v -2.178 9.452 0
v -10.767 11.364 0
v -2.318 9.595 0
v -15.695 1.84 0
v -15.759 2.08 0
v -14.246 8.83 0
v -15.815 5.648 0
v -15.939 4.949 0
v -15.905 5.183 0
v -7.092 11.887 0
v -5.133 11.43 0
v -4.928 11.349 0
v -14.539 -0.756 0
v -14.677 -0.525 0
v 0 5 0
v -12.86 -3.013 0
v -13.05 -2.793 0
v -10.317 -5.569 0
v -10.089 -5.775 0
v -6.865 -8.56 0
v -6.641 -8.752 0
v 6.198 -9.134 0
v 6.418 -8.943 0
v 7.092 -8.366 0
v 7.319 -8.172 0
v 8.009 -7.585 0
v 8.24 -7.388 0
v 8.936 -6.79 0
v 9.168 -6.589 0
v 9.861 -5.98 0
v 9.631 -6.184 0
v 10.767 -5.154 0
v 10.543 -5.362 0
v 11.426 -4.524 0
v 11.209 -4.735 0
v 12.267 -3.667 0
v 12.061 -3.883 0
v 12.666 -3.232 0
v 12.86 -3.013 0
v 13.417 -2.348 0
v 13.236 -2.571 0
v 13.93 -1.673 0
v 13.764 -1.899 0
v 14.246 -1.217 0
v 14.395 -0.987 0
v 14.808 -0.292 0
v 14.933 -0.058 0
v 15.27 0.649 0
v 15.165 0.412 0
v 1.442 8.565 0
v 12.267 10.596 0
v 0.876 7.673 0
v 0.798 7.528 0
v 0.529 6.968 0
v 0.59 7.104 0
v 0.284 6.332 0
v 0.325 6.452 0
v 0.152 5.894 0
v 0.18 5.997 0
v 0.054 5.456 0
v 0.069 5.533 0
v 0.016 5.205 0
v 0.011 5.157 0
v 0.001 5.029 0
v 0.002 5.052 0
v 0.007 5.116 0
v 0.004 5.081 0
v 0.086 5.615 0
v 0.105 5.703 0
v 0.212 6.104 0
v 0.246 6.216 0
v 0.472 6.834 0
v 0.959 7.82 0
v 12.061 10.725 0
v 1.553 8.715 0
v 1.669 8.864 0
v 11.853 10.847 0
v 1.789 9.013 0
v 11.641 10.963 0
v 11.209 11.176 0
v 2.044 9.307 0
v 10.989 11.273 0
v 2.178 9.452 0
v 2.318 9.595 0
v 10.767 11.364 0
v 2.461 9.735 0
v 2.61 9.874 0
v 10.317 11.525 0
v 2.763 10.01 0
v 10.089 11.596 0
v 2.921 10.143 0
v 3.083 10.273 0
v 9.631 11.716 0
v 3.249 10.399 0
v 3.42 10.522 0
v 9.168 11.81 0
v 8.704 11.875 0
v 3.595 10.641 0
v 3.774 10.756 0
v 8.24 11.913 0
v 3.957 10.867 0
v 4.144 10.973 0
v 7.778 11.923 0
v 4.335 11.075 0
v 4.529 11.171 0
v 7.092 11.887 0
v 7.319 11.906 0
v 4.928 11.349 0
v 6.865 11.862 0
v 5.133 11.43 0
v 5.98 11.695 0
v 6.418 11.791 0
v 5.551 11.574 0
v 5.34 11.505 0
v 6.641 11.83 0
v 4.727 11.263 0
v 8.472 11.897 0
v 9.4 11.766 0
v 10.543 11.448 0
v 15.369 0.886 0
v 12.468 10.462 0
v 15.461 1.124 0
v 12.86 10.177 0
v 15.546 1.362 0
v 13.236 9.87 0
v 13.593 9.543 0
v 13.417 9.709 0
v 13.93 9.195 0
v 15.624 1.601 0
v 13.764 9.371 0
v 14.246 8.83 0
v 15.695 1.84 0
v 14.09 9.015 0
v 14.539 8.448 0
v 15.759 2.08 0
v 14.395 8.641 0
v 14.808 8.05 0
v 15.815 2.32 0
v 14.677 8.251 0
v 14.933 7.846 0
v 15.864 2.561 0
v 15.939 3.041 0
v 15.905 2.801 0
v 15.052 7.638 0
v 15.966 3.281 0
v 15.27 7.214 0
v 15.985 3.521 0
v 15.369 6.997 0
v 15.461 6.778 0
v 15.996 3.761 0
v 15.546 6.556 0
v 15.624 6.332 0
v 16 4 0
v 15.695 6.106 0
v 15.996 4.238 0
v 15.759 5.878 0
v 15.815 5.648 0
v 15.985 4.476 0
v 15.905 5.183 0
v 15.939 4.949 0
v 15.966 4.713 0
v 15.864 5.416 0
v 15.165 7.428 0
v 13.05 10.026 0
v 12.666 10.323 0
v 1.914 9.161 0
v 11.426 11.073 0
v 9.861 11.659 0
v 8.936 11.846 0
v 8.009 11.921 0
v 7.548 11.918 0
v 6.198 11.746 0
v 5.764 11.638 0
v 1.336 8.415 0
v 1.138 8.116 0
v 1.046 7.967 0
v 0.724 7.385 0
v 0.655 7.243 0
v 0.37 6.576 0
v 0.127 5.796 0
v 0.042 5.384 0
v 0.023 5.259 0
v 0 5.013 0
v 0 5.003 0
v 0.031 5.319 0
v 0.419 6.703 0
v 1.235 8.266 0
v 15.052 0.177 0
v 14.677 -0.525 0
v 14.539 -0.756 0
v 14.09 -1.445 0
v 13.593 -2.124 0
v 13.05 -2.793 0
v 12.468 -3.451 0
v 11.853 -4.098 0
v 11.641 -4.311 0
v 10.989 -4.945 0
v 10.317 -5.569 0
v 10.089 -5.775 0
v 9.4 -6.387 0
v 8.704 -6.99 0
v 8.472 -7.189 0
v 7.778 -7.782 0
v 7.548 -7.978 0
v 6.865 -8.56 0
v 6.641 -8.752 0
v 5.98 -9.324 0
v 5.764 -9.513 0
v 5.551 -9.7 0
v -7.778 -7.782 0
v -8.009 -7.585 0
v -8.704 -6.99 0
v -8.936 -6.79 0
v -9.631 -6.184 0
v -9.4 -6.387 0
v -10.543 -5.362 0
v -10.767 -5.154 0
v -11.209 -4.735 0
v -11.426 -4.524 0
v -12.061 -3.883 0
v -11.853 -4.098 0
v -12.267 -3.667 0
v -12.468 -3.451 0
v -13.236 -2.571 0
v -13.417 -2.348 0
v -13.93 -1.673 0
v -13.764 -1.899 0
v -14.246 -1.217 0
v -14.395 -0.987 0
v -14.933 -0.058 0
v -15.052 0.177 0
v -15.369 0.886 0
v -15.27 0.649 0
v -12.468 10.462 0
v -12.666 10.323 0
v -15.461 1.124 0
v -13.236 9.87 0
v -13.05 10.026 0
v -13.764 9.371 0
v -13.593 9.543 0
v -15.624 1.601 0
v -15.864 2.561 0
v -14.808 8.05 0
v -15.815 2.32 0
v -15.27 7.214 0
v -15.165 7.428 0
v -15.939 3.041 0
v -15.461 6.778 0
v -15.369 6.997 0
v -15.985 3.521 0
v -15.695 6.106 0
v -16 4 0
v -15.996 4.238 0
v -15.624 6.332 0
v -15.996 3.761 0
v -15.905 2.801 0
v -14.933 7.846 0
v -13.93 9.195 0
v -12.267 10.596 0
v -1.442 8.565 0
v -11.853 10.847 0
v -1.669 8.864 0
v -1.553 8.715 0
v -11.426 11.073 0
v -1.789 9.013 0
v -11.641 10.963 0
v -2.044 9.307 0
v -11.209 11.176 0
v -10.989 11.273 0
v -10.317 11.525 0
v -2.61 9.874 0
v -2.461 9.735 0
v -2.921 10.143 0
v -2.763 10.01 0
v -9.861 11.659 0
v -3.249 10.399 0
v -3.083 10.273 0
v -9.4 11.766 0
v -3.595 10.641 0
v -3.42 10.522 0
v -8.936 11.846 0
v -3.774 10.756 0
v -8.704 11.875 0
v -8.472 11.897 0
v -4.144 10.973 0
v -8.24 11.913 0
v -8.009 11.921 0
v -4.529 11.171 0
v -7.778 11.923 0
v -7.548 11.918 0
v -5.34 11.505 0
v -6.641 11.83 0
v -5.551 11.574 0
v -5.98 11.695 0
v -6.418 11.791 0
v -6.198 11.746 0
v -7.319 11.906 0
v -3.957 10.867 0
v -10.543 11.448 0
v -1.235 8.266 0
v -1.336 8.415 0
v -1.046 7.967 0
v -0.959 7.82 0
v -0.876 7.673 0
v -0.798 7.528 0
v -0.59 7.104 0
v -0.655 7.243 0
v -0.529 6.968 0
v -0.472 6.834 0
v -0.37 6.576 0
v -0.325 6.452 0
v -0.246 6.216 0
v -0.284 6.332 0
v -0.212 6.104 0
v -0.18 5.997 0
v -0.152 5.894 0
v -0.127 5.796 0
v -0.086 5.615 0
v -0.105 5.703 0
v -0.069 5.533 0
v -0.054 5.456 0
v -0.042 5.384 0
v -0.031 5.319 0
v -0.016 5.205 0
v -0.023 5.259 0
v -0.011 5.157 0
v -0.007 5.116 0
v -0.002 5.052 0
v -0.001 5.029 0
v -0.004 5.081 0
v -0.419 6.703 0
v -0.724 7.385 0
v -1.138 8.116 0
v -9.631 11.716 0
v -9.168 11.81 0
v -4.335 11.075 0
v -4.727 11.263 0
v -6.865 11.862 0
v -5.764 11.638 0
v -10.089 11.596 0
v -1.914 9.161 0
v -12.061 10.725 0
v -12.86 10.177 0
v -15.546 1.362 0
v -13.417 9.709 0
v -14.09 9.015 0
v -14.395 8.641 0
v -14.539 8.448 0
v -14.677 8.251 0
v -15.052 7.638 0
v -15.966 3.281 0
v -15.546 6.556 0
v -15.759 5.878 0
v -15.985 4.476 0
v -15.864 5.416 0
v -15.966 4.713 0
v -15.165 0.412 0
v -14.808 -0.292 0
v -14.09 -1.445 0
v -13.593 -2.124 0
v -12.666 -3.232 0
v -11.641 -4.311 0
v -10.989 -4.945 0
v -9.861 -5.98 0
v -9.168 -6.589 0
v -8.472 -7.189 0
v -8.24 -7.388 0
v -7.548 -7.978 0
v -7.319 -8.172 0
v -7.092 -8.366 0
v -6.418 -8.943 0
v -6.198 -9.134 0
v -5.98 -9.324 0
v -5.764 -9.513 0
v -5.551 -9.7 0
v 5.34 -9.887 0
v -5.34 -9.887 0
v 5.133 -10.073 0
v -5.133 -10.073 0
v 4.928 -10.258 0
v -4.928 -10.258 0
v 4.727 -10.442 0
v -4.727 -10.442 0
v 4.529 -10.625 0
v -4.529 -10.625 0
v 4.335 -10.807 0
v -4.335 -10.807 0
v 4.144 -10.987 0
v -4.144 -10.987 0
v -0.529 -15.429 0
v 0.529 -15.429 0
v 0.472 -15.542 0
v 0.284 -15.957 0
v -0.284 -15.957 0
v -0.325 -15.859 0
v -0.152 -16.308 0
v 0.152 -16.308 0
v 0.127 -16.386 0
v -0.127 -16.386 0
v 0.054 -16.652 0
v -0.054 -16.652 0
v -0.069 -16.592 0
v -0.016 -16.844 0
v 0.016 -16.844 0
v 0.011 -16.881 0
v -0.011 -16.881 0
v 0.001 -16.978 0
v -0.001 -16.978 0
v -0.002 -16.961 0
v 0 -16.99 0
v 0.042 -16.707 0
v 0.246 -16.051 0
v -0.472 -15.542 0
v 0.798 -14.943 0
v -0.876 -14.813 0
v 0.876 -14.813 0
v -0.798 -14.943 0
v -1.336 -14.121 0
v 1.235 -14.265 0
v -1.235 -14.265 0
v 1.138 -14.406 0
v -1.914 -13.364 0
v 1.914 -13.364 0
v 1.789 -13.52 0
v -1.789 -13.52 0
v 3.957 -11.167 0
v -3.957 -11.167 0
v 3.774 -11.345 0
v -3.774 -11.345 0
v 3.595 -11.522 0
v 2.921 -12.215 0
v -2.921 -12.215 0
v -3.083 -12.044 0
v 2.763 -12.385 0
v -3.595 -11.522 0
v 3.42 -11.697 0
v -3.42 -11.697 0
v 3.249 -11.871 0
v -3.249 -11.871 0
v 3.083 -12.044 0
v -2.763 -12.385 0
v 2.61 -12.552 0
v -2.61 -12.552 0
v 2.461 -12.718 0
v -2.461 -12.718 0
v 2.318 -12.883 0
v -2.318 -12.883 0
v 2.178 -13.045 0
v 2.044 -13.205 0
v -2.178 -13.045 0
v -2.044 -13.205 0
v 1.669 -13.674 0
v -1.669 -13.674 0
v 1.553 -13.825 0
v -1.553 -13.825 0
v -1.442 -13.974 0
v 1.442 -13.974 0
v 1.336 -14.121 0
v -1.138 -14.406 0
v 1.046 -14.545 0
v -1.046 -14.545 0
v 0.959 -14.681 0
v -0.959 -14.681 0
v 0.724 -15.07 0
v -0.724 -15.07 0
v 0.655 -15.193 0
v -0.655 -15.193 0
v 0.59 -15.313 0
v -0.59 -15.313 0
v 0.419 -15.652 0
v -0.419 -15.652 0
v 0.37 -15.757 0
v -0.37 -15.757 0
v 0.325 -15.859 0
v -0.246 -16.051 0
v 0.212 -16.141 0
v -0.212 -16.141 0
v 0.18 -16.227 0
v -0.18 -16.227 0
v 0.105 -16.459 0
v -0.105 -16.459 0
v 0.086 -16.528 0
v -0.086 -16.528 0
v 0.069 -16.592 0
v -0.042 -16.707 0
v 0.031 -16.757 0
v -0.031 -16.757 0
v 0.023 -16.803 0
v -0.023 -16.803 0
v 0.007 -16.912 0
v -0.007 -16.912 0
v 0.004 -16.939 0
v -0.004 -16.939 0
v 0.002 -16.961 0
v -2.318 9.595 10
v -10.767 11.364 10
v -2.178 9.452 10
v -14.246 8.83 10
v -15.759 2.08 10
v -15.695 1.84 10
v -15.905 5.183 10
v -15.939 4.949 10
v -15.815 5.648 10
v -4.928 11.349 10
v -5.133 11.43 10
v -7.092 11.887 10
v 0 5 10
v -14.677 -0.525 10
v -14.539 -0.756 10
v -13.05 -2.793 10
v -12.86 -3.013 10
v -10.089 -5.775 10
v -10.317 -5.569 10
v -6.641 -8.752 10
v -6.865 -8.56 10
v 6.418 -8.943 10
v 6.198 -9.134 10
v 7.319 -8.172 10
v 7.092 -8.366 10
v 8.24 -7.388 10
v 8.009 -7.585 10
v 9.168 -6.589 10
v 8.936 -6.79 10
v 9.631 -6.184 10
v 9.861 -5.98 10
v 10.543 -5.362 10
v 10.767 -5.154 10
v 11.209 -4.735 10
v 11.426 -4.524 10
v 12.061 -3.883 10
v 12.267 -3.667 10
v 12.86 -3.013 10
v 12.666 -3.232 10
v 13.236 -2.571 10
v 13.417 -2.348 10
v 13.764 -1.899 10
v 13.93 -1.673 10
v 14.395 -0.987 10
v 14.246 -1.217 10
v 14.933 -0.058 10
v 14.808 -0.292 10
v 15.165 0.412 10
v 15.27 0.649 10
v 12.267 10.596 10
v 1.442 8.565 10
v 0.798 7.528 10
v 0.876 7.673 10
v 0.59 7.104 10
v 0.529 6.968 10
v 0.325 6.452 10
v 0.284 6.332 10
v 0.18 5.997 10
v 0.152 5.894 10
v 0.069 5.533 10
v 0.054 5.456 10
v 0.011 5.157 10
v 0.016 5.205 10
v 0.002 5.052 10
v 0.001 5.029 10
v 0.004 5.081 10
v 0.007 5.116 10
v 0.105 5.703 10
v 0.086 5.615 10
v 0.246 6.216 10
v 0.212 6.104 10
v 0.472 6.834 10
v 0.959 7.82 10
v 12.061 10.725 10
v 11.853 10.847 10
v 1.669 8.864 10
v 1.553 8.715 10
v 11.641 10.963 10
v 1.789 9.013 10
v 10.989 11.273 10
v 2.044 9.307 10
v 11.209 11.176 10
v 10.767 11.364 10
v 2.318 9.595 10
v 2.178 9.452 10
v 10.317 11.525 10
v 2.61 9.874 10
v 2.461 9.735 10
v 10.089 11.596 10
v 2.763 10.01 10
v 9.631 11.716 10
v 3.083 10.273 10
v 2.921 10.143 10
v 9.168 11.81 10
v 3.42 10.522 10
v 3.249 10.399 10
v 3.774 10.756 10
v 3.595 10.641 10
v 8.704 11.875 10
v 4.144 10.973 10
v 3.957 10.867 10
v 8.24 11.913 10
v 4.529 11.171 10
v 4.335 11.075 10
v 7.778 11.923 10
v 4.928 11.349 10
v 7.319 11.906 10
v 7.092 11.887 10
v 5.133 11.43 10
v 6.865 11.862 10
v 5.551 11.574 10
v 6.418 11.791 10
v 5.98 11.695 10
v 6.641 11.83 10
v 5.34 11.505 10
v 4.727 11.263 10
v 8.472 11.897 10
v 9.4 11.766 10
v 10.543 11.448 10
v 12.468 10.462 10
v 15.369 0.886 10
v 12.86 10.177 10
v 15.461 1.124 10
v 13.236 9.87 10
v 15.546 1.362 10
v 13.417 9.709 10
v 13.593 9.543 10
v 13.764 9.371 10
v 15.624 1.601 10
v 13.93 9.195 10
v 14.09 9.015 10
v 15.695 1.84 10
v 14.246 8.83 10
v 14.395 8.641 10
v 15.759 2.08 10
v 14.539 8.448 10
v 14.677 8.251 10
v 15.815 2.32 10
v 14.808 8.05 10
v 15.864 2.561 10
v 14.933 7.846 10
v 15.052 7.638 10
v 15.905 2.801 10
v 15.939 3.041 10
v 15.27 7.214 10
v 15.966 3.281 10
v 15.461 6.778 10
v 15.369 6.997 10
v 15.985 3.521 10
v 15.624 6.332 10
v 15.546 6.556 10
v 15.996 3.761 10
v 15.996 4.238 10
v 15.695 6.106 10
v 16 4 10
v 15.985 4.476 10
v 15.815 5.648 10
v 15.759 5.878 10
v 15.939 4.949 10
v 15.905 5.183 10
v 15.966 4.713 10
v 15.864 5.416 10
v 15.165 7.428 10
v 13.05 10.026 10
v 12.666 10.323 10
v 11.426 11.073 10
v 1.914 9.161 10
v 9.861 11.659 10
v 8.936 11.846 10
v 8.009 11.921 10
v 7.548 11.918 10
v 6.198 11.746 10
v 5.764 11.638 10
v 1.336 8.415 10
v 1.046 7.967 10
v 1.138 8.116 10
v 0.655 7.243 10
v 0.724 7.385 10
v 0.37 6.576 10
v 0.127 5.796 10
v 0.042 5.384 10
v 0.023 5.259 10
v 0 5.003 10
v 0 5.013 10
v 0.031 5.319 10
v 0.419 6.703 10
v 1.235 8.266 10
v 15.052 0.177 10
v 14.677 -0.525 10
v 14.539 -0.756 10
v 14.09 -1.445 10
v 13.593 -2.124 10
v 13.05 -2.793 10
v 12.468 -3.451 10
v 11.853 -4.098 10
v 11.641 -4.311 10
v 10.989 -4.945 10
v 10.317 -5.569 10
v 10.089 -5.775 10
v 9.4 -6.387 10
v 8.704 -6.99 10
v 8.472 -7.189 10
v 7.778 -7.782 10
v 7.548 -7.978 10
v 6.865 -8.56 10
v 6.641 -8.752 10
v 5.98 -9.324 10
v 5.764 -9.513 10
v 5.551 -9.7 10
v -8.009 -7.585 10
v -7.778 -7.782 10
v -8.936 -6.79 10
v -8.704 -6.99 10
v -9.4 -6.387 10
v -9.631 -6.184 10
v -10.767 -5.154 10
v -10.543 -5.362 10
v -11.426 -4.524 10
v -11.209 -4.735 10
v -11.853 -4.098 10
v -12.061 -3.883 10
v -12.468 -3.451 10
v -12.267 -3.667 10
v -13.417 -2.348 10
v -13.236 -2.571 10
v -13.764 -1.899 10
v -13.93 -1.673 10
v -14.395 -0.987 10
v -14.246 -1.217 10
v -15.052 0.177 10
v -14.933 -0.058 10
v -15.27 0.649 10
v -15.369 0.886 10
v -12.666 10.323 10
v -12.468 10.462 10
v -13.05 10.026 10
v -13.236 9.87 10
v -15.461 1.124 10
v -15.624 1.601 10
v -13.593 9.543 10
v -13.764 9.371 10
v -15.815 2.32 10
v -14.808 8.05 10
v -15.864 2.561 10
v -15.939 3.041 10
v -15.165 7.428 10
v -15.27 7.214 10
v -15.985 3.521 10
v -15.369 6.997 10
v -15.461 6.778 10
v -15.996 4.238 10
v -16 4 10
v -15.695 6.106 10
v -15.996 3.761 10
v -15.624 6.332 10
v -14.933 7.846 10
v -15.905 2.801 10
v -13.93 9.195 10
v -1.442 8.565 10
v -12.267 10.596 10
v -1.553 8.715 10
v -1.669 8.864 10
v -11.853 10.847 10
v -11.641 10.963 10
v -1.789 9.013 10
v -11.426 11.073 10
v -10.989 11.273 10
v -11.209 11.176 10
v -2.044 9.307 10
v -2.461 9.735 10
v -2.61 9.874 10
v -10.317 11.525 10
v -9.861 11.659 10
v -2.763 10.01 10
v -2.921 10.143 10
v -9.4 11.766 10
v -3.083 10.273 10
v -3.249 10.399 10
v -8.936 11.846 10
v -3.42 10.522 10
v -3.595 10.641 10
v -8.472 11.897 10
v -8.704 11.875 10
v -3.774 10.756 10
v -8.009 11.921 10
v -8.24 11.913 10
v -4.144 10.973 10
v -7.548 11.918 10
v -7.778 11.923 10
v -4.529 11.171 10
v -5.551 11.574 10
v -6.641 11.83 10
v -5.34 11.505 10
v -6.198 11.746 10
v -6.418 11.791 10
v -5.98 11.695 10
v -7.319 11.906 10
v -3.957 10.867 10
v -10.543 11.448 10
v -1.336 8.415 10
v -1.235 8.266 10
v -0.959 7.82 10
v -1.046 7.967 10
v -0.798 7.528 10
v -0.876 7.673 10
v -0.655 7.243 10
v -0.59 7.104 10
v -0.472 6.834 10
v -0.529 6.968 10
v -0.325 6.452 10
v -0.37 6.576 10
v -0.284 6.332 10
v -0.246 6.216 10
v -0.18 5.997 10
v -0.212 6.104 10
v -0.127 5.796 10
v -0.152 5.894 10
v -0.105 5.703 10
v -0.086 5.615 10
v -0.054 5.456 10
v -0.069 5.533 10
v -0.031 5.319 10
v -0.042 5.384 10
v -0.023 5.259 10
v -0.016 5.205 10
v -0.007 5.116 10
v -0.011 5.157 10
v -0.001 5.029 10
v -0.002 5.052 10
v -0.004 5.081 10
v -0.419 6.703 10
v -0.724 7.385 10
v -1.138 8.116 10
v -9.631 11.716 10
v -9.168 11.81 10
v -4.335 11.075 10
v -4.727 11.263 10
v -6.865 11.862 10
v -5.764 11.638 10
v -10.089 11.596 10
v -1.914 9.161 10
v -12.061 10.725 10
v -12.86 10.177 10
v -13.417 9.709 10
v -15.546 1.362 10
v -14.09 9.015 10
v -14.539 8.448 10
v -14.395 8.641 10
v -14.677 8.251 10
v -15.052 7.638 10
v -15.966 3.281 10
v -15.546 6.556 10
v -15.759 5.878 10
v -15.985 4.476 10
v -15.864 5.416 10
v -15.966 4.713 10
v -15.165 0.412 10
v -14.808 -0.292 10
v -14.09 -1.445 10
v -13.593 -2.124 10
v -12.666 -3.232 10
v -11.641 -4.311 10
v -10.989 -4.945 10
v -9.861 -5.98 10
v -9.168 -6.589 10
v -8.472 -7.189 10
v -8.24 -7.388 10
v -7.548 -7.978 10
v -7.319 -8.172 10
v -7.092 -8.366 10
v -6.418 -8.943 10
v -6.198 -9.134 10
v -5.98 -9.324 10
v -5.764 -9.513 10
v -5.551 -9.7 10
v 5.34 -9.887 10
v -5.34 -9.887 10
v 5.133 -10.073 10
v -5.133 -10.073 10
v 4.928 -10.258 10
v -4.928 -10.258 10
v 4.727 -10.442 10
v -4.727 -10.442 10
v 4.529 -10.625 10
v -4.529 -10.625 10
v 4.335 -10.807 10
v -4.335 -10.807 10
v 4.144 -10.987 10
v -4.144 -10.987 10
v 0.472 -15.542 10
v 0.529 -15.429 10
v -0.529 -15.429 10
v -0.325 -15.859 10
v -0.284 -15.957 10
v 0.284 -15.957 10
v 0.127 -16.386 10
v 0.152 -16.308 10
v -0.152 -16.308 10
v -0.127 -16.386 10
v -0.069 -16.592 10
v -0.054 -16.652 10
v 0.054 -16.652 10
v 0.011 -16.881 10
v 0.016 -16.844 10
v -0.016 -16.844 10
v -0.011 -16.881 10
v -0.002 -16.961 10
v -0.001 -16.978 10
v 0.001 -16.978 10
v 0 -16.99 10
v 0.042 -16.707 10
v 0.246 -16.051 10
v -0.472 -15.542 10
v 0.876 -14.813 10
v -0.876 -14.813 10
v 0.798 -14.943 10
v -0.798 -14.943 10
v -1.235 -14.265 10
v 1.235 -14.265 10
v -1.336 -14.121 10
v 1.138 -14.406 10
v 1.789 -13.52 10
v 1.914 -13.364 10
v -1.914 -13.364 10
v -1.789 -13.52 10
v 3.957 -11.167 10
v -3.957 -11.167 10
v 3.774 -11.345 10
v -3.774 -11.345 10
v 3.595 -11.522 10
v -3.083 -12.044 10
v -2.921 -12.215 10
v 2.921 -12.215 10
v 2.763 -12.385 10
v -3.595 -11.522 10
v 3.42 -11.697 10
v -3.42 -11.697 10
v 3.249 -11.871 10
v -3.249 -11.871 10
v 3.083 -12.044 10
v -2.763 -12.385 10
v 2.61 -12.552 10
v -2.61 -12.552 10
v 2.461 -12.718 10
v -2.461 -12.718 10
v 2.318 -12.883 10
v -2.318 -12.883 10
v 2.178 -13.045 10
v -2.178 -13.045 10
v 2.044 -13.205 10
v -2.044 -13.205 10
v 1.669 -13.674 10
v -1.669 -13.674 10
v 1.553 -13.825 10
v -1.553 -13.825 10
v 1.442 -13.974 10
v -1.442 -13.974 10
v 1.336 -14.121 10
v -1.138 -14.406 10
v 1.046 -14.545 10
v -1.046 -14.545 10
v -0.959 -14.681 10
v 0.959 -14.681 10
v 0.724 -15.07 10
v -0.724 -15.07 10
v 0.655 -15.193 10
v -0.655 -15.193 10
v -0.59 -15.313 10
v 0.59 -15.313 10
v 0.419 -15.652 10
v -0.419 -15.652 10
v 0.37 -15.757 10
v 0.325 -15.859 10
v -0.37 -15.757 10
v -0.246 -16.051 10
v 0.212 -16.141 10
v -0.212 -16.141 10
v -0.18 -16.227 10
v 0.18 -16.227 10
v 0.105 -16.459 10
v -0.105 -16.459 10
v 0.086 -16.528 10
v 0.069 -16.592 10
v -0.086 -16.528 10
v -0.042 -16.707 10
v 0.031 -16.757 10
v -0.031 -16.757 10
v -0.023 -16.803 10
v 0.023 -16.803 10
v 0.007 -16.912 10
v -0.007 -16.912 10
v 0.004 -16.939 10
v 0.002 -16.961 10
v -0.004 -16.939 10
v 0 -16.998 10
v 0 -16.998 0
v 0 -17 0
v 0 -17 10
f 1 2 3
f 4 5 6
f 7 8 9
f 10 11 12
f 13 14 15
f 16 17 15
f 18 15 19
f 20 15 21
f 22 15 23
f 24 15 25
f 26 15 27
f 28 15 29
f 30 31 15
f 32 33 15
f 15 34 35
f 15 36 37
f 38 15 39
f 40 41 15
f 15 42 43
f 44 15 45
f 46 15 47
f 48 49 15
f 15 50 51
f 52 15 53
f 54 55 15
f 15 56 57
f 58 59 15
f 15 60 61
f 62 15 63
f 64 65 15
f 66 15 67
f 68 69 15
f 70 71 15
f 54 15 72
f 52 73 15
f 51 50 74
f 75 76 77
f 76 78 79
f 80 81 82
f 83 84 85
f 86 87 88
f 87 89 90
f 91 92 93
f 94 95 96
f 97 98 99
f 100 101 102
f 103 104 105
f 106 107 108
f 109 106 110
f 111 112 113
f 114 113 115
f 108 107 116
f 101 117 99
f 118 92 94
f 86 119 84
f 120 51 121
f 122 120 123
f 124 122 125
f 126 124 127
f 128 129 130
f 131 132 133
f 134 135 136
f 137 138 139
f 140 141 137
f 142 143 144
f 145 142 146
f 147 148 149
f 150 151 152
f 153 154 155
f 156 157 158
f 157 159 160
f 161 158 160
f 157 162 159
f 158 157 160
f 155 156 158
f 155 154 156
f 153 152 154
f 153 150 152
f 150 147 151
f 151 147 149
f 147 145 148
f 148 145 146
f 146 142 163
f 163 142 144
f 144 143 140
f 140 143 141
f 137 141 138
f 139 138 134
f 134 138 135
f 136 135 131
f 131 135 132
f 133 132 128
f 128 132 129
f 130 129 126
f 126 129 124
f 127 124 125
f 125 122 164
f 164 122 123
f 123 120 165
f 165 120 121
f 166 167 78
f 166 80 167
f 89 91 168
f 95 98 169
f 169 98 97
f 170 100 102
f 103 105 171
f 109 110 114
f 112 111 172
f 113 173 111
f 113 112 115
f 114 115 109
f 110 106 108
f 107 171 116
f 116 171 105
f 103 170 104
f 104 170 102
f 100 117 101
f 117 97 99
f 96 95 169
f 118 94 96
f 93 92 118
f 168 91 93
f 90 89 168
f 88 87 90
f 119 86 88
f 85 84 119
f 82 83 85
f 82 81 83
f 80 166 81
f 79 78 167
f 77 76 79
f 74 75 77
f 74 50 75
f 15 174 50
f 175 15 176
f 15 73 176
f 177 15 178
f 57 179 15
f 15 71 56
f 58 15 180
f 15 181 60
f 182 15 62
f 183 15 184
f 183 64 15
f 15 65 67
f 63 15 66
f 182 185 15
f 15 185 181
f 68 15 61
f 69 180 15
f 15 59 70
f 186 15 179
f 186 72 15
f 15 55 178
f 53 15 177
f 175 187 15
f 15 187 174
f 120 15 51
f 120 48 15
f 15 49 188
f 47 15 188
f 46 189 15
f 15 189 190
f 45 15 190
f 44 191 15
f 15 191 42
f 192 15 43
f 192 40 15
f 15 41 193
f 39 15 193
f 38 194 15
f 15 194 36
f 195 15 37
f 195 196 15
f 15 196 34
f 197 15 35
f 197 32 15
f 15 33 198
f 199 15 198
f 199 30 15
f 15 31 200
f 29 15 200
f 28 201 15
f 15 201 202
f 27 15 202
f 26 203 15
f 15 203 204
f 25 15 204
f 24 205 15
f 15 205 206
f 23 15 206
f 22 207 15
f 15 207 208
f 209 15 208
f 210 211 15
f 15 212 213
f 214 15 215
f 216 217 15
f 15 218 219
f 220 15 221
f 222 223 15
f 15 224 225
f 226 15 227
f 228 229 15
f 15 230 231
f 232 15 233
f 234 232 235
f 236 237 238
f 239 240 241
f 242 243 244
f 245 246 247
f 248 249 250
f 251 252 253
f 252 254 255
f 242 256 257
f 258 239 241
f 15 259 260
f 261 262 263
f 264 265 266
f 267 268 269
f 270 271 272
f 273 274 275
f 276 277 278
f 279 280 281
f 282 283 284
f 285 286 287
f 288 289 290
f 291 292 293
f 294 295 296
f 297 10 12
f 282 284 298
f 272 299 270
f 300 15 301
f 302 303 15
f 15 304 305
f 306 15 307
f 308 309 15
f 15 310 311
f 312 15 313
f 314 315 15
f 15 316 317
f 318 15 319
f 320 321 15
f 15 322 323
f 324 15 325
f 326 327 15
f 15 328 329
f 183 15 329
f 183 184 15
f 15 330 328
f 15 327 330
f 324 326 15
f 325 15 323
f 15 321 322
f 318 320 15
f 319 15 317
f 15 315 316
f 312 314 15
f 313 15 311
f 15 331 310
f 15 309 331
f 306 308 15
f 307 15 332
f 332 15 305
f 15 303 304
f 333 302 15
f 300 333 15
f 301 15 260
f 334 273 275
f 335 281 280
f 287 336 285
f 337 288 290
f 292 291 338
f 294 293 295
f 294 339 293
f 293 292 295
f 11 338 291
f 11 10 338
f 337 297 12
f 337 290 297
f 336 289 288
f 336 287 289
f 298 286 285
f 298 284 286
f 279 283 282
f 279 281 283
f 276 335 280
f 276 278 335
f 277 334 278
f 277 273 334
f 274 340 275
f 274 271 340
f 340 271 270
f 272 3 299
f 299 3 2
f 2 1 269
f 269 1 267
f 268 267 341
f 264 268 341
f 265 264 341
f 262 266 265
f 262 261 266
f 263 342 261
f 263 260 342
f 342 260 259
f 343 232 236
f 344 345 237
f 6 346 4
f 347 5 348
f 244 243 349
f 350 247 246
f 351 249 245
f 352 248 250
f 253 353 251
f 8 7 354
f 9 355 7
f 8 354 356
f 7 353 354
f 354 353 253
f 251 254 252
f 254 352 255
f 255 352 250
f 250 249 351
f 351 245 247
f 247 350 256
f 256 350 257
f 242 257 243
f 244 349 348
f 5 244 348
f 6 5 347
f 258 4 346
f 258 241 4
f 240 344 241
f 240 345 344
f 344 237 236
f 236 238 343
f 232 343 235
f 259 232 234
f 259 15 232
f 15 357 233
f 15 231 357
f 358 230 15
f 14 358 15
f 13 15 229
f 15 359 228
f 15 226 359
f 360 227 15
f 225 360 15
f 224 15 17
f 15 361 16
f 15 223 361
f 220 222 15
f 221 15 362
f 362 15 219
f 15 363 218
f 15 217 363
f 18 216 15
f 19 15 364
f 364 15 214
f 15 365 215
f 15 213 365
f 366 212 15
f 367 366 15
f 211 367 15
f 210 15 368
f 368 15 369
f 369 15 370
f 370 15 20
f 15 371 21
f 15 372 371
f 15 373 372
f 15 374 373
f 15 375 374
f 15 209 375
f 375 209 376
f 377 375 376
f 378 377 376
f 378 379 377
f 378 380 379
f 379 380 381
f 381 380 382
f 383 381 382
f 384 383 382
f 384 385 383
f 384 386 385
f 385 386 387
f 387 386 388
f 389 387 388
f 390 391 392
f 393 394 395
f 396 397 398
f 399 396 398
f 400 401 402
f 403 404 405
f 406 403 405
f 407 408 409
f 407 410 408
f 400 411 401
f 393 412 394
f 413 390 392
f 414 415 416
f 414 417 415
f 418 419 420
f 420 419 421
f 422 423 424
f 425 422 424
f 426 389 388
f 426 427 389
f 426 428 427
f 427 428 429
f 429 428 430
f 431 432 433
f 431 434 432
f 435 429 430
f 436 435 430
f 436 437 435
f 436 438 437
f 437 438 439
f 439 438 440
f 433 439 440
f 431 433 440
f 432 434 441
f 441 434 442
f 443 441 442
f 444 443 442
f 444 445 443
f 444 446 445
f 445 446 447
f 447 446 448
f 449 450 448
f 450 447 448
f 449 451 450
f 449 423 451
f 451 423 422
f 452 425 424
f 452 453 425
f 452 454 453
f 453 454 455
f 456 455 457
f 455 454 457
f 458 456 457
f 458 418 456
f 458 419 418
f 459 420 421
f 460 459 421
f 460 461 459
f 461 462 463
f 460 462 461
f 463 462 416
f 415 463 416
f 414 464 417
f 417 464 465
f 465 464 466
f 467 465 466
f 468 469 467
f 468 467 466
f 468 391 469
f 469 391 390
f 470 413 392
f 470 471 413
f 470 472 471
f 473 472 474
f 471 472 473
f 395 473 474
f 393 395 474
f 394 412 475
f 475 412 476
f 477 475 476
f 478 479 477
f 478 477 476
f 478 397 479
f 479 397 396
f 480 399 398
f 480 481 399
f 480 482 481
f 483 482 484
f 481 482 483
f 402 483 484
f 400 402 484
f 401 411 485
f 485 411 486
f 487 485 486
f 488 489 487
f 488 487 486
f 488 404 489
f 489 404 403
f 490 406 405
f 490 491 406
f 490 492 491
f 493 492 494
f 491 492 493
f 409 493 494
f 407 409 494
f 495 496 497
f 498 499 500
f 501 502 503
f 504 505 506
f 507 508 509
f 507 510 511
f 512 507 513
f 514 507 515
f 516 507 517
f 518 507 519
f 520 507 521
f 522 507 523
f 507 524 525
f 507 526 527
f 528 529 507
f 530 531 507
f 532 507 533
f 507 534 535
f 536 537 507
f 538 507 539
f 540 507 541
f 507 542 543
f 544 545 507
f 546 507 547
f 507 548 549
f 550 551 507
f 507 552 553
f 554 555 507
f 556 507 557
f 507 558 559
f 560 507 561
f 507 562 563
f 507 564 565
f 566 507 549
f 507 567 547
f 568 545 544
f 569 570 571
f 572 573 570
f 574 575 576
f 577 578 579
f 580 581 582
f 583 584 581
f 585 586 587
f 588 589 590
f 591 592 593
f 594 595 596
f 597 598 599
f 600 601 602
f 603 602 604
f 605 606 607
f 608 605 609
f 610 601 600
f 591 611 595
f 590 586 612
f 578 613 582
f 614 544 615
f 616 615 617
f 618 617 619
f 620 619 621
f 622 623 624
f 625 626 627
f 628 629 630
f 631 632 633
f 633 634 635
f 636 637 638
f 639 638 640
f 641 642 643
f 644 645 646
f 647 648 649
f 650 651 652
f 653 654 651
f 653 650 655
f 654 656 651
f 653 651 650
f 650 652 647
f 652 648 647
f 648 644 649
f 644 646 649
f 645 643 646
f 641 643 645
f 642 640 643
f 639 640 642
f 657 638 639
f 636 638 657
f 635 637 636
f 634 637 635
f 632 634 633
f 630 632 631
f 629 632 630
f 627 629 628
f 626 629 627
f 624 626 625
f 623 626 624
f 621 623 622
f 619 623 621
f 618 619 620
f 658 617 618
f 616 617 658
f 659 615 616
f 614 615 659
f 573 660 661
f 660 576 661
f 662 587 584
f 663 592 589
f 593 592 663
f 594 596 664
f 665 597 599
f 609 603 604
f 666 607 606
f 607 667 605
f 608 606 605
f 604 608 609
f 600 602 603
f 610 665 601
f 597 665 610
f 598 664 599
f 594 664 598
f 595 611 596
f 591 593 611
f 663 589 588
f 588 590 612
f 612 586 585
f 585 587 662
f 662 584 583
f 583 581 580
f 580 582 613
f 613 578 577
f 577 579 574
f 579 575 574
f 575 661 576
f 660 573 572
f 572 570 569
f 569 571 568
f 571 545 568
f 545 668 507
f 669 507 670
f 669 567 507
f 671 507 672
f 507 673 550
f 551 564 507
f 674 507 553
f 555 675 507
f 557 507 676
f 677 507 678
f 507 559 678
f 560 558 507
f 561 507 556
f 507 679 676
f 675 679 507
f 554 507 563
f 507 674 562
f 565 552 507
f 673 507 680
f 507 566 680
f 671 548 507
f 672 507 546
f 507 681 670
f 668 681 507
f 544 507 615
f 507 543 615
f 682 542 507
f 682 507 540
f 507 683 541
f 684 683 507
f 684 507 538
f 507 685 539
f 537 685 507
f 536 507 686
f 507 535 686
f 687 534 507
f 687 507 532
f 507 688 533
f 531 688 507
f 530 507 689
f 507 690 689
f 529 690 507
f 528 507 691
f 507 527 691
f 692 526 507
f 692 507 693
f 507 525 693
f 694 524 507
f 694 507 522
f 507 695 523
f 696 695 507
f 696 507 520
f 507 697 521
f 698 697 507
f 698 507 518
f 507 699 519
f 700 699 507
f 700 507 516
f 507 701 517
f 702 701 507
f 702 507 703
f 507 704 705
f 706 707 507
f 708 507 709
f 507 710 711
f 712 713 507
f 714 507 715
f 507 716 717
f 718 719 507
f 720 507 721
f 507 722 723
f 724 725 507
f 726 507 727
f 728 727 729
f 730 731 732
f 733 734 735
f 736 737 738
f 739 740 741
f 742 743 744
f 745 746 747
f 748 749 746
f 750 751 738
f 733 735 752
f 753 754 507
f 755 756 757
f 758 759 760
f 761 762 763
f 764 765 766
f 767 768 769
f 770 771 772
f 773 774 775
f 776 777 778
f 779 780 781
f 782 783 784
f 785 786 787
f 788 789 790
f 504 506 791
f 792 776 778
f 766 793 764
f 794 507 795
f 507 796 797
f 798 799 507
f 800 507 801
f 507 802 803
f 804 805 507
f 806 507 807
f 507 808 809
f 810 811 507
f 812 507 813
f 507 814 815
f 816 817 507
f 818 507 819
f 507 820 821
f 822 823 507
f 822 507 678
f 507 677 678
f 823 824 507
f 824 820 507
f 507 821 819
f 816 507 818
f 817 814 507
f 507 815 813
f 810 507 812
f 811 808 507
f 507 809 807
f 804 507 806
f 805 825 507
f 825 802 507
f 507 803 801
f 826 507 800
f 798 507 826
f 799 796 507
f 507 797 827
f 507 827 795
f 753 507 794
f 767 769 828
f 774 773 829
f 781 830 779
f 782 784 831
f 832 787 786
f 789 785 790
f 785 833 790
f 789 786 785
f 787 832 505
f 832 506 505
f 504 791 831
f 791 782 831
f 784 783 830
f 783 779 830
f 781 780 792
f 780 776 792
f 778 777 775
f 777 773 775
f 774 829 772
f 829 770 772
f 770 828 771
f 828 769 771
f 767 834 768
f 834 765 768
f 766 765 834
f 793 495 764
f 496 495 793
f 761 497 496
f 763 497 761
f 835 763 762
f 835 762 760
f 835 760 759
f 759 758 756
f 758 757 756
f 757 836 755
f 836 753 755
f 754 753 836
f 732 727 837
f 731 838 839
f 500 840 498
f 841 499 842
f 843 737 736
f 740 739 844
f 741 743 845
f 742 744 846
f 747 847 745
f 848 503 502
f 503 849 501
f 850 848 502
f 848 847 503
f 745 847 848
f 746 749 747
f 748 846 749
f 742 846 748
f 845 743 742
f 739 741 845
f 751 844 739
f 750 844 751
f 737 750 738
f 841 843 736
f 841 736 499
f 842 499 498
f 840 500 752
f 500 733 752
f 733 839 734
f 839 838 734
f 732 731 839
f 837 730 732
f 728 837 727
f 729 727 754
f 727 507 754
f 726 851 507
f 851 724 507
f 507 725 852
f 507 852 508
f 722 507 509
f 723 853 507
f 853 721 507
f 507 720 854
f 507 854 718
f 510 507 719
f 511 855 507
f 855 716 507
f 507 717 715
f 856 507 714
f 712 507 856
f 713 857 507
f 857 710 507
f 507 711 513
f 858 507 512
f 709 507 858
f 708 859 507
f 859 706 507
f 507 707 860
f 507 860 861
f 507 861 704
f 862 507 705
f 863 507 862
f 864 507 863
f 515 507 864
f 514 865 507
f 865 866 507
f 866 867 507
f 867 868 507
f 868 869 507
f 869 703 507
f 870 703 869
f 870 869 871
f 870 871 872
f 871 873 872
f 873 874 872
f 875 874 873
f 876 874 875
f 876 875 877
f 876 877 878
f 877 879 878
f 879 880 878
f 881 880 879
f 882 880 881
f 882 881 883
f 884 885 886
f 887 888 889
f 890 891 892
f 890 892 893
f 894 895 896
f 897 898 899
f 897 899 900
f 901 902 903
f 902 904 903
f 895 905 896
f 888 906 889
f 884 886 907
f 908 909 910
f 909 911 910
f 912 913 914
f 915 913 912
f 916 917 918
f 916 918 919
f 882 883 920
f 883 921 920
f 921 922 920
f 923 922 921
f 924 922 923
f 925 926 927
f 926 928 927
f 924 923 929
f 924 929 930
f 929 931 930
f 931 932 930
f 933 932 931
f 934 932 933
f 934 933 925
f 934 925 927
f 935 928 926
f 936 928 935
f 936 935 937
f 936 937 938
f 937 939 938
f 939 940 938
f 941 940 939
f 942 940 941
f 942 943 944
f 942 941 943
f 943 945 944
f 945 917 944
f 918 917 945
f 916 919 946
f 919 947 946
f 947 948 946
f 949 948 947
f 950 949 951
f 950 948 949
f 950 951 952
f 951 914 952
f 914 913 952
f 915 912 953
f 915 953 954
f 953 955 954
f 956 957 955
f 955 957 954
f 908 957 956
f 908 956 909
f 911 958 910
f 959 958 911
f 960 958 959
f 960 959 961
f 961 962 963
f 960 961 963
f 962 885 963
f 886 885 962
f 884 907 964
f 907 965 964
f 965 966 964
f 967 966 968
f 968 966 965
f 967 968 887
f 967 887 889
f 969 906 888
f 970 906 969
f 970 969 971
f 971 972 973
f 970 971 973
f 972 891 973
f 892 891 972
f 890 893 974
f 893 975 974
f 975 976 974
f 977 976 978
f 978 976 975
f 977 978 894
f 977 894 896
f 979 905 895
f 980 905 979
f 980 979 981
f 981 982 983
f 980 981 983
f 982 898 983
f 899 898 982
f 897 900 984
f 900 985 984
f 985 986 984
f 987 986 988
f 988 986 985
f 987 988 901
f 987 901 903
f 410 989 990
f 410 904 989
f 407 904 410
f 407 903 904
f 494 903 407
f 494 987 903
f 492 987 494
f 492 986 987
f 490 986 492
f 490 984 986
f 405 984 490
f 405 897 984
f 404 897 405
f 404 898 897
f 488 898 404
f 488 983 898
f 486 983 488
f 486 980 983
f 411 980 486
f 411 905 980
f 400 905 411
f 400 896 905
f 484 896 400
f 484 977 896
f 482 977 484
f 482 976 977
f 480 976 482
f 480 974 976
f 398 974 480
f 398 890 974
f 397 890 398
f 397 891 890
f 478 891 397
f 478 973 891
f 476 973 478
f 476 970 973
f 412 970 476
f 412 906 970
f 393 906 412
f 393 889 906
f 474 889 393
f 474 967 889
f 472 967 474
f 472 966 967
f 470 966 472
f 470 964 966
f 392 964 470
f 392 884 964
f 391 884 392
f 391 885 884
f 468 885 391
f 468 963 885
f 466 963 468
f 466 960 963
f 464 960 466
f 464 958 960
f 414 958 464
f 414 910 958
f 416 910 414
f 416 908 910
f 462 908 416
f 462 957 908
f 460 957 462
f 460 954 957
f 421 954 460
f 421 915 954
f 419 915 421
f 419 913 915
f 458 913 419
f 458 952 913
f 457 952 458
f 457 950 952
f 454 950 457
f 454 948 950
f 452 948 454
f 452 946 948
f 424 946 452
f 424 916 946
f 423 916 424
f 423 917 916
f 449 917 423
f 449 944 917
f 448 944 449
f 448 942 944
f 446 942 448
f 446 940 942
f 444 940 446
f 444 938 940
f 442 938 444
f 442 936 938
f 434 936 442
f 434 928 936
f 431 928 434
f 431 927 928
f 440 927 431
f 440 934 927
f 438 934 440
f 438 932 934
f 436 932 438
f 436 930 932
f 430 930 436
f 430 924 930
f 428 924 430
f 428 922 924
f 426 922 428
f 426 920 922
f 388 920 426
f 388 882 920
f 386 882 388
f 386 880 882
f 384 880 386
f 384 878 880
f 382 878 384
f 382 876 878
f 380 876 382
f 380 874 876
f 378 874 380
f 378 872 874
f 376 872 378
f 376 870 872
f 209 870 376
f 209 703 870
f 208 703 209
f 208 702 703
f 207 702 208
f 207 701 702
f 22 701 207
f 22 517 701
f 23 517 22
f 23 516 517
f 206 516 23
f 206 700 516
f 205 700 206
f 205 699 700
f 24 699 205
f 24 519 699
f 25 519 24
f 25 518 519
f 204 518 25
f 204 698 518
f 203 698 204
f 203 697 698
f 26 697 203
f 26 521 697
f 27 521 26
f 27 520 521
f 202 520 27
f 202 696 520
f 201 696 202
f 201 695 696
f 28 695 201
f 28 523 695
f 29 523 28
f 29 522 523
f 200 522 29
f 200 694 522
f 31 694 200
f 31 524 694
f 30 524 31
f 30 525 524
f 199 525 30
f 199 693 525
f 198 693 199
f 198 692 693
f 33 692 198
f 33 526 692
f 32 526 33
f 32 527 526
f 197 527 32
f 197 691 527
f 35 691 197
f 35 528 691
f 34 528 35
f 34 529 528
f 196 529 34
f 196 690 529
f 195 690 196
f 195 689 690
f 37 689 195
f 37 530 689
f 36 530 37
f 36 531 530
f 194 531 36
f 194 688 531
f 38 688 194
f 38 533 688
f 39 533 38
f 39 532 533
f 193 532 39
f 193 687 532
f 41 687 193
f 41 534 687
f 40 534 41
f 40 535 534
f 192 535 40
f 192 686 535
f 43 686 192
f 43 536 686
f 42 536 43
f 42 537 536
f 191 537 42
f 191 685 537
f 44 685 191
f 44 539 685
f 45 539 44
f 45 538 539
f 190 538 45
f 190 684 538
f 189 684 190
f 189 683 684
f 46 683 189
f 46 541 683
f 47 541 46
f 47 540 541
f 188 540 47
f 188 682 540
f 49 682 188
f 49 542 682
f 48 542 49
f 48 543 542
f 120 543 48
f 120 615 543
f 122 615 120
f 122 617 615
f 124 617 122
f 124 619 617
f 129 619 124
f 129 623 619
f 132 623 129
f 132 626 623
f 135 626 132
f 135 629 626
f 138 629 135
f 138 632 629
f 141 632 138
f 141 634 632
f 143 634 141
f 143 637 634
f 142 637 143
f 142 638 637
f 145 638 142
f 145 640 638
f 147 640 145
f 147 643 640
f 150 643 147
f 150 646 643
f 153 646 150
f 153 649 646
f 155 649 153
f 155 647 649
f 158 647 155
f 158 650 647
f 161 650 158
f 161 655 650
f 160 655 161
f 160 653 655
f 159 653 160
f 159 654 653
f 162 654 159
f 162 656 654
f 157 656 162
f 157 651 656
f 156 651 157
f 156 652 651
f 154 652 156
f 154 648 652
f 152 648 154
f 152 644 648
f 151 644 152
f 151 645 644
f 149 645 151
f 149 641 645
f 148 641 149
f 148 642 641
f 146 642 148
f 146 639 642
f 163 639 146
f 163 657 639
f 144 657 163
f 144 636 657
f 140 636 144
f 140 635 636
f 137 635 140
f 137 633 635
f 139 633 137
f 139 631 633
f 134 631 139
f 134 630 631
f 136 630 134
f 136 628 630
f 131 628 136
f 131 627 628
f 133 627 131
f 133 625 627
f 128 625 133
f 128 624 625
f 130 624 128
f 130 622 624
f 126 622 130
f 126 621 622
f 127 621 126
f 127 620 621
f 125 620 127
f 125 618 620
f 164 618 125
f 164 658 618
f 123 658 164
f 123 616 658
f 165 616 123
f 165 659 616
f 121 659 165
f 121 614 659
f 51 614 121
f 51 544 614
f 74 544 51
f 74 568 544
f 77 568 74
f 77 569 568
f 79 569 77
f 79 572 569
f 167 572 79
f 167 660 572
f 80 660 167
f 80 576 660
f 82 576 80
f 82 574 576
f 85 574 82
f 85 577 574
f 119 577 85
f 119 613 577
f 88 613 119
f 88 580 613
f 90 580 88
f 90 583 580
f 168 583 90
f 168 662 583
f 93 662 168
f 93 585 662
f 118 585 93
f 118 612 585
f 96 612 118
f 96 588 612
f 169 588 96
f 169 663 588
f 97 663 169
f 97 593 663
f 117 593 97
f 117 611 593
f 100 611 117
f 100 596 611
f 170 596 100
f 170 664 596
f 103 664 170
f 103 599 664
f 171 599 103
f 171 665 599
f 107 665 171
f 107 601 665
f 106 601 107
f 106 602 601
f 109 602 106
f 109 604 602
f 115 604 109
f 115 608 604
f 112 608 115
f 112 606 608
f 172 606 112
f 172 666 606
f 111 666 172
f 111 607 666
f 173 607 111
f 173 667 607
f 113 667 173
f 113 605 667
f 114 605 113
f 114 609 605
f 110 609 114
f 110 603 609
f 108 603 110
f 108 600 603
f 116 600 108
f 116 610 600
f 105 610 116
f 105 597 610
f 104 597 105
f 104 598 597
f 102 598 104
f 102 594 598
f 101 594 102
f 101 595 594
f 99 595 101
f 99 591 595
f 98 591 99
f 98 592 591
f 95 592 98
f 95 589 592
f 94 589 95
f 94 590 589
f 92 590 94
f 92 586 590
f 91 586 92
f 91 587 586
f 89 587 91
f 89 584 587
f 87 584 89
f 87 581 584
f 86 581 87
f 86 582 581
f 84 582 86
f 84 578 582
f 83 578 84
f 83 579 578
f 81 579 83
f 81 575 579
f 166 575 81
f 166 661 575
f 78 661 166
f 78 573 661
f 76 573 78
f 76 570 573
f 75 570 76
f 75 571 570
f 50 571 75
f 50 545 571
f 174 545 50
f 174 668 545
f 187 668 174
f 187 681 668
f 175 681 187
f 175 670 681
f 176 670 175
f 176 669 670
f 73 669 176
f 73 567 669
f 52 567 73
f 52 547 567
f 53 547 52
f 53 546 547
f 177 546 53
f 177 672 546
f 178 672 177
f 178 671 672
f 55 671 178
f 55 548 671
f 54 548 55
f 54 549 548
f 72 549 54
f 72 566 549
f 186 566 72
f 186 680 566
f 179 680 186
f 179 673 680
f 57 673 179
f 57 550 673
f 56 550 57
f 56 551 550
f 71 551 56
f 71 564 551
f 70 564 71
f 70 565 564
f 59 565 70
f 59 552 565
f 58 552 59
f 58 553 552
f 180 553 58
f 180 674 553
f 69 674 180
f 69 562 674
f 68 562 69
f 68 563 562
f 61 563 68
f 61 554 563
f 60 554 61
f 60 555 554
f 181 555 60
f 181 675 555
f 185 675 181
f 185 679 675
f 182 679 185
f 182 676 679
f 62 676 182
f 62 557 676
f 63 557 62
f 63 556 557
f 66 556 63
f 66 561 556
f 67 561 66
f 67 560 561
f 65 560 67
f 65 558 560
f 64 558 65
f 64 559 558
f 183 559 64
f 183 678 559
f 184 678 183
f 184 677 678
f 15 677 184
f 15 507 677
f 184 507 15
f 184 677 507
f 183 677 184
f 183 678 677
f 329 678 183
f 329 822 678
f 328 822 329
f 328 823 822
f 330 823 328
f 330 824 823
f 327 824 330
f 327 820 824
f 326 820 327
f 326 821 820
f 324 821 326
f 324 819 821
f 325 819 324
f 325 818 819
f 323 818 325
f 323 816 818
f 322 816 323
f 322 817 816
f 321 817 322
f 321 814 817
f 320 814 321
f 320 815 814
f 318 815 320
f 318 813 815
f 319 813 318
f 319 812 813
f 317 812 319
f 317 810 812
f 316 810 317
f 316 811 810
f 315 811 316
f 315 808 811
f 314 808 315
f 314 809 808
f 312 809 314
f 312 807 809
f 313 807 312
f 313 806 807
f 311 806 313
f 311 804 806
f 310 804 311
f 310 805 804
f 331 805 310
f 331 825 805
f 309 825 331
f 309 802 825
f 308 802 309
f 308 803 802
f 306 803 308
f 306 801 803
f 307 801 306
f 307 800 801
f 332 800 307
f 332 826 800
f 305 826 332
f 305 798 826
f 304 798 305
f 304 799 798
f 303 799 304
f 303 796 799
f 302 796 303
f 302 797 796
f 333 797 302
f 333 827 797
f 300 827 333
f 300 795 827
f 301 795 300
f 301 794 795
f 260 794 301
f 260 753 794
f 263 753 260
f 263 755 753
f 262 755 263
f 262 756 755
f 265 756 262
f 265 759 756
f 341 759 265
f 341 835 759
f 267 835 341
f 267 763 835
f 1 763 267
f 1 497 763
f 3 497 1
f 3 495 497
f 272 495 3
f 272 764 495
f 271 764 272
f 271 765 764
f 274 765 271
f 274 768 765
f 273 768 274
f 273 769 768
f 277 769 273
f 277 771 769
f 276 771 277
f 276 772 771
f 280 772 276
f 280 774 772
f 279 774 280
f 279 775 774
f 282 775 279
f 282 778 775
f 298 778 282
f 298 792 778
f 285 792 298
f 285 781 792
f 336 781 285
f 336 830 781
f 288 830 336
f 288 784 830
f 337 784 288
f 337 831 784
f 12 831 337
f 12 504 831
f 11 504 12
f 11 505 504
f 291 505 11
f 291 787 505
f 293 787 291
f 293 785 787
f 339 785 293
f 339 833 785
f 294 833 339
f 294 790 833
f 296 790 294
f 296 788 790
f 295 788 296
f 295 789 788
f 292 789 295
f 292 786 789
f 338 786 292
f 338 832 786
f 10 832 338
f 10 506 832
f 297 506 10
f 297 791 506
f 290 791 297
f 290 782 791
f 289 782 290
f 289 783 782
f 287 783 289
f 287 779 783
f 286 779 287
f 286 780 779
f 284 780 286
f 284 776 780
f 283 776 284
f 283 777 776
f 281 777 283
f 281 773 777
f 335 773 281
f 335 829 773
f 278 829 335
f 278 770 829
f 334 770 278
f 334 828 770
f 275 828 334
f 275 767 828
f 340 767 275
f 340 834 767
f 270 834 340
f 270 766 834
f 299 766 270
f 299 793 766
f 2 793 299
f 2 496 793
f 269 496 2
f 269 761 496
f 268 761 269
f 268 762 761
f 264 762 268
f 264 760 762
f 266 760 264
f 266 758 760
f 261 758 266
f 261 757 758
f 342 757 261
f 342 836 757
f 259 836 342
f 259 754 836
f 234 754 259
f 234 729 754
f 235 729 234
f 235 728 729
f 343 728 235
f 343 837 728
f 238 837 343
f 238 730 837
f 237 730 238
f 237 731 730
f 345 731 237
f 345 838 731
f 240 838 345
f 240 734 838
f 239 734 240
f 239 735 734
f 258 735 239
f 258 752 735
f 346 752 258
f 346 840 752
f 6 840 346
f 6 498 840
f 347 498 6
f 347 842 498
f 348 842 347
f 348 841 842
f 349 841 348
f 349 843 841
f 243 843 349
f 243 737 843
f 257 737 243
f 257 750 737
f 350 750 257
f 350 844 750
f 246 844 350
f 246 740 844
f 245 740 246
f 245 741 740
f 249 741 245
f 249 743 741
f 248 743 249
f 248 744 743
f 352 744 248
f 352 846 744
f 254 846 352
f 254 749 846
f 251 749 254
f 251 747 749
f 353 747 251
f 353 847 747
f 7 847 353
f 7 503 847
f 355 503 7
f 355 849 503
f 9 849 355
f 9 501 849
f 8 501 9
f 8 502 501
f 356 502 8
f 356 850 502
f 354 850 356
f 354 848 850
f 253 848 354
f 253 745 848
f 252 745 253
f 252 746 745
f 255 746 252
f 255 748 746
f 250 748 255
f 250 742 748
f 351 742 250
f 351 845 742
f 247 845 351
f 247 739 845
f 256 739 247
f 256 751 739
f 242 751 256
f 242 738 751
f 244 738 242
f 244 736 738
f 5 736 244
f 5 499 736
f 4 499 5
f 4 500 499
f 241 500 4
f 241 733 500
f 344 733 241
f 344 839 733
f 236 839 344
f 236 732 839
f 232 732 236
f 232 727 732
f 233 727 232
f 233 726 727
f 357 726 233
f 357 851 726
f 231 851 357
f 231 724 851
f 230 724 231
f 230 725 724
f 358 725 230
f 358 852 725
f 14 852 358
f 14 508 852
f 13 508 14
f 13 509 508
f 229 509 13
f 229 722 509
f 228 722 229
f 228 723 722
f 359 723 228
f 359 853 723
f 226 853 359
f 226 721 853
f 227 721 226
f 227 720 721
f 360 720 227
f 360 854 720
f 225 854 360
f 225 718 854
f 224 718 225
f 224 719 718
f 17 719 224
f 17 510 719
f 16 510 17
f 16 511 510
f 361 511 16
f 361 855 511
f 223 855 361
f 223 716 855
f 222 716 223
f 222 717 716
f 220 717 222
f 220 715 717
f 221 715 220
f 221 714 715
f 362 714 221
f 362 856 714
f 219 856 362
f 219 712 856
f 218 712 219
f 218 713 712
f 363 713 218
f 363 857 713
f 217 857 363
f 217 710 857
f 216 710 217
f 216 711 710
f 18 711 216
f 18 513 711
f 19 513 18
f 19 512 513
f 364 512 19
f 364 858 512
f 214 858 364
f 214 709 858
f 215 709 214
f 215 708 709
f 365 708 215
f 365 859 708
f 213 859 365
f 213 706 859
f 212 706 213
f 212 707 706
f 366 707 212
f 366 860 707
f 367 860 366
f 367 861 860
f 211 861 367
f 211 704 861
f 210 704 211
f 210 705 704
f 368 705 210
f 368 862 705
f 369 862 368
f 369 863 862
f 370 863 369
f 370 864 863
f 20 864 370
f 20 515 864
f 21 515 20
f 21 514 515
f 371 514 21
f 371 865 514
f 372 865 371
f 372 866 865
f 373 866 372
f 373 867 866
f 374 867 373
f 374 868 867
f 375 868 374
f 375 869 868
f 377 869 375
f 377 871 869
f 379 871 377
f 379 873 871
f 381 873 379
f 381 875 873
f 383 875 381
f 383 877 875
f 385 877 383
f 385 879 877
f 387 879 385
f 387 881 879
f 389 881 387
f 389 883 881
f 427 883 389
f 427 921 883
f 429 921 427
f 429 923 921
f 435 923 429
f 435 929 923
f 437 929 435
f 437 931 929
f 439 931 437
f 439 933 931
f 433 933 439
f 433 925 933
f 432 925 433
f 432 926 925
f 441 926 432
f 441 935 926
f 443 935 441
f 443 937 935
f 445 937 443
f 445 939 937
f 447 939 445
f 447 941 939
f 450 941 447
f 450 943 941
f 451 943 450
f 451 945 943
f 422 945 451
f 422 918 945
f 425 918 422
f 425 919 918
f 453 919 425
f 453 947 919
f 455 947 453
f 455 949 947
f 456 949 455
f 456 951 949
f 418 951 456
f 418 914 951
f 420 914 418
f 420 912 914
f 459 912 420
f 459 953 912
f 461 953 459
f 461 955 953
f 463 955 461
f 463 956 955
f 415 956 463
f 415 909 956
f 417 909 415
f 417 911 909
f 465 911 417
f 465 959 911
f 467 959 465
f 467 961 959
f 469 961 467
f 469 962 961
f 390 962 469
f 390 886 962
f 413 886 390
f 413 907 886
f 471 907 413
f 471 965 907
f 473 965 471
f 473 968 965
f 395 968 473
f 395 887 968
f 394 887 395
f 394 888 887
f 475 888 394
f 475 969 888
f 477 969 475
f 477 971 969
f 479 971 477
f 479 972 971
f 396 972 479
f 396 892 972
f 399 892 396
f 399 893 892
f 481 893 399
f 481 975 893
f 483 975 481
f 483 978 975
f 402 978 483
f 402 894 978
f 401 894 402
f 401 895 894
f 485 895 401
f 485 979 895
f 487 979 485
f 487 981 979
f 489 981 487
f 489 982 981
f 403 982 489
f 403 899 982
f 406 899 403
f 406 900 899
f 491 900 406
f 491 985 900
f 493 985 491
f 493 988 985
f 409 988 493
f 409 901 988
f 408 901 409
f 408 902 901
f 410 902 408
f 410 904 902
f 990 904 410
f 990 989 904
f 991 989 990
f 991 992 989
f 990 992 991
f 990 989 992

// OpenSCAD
/*
h1 = 23;
h2 = 10;
h3 = 8;
d1 = 25;
d2 = 12;
d3 = 15;

p0 = [0,0];
p1 = [0,h1+h2];
p2 = [d3,h1];
p3 = [d1+d2,h1+h2];
p4 = [d1+d2,h3];
p5 = [d1,0];

points = [p0,p1,p2,p3,p4,p5];

linear_extrude(height=80)
    polygon(points);
rotate_extrude(angle=360)
    translate([50,0,0])
        polygon(points);

*/

n=500;
h=10;
step=360/n;
points=[for(t=[0:step:359.999]) [16*pow(sin(t),3), 13*cos(t) - 5*cos(2*t) - 2*cos(3*t) - cos(4*t)] ];
linear_extrude(height=h)
    polygon(points);
